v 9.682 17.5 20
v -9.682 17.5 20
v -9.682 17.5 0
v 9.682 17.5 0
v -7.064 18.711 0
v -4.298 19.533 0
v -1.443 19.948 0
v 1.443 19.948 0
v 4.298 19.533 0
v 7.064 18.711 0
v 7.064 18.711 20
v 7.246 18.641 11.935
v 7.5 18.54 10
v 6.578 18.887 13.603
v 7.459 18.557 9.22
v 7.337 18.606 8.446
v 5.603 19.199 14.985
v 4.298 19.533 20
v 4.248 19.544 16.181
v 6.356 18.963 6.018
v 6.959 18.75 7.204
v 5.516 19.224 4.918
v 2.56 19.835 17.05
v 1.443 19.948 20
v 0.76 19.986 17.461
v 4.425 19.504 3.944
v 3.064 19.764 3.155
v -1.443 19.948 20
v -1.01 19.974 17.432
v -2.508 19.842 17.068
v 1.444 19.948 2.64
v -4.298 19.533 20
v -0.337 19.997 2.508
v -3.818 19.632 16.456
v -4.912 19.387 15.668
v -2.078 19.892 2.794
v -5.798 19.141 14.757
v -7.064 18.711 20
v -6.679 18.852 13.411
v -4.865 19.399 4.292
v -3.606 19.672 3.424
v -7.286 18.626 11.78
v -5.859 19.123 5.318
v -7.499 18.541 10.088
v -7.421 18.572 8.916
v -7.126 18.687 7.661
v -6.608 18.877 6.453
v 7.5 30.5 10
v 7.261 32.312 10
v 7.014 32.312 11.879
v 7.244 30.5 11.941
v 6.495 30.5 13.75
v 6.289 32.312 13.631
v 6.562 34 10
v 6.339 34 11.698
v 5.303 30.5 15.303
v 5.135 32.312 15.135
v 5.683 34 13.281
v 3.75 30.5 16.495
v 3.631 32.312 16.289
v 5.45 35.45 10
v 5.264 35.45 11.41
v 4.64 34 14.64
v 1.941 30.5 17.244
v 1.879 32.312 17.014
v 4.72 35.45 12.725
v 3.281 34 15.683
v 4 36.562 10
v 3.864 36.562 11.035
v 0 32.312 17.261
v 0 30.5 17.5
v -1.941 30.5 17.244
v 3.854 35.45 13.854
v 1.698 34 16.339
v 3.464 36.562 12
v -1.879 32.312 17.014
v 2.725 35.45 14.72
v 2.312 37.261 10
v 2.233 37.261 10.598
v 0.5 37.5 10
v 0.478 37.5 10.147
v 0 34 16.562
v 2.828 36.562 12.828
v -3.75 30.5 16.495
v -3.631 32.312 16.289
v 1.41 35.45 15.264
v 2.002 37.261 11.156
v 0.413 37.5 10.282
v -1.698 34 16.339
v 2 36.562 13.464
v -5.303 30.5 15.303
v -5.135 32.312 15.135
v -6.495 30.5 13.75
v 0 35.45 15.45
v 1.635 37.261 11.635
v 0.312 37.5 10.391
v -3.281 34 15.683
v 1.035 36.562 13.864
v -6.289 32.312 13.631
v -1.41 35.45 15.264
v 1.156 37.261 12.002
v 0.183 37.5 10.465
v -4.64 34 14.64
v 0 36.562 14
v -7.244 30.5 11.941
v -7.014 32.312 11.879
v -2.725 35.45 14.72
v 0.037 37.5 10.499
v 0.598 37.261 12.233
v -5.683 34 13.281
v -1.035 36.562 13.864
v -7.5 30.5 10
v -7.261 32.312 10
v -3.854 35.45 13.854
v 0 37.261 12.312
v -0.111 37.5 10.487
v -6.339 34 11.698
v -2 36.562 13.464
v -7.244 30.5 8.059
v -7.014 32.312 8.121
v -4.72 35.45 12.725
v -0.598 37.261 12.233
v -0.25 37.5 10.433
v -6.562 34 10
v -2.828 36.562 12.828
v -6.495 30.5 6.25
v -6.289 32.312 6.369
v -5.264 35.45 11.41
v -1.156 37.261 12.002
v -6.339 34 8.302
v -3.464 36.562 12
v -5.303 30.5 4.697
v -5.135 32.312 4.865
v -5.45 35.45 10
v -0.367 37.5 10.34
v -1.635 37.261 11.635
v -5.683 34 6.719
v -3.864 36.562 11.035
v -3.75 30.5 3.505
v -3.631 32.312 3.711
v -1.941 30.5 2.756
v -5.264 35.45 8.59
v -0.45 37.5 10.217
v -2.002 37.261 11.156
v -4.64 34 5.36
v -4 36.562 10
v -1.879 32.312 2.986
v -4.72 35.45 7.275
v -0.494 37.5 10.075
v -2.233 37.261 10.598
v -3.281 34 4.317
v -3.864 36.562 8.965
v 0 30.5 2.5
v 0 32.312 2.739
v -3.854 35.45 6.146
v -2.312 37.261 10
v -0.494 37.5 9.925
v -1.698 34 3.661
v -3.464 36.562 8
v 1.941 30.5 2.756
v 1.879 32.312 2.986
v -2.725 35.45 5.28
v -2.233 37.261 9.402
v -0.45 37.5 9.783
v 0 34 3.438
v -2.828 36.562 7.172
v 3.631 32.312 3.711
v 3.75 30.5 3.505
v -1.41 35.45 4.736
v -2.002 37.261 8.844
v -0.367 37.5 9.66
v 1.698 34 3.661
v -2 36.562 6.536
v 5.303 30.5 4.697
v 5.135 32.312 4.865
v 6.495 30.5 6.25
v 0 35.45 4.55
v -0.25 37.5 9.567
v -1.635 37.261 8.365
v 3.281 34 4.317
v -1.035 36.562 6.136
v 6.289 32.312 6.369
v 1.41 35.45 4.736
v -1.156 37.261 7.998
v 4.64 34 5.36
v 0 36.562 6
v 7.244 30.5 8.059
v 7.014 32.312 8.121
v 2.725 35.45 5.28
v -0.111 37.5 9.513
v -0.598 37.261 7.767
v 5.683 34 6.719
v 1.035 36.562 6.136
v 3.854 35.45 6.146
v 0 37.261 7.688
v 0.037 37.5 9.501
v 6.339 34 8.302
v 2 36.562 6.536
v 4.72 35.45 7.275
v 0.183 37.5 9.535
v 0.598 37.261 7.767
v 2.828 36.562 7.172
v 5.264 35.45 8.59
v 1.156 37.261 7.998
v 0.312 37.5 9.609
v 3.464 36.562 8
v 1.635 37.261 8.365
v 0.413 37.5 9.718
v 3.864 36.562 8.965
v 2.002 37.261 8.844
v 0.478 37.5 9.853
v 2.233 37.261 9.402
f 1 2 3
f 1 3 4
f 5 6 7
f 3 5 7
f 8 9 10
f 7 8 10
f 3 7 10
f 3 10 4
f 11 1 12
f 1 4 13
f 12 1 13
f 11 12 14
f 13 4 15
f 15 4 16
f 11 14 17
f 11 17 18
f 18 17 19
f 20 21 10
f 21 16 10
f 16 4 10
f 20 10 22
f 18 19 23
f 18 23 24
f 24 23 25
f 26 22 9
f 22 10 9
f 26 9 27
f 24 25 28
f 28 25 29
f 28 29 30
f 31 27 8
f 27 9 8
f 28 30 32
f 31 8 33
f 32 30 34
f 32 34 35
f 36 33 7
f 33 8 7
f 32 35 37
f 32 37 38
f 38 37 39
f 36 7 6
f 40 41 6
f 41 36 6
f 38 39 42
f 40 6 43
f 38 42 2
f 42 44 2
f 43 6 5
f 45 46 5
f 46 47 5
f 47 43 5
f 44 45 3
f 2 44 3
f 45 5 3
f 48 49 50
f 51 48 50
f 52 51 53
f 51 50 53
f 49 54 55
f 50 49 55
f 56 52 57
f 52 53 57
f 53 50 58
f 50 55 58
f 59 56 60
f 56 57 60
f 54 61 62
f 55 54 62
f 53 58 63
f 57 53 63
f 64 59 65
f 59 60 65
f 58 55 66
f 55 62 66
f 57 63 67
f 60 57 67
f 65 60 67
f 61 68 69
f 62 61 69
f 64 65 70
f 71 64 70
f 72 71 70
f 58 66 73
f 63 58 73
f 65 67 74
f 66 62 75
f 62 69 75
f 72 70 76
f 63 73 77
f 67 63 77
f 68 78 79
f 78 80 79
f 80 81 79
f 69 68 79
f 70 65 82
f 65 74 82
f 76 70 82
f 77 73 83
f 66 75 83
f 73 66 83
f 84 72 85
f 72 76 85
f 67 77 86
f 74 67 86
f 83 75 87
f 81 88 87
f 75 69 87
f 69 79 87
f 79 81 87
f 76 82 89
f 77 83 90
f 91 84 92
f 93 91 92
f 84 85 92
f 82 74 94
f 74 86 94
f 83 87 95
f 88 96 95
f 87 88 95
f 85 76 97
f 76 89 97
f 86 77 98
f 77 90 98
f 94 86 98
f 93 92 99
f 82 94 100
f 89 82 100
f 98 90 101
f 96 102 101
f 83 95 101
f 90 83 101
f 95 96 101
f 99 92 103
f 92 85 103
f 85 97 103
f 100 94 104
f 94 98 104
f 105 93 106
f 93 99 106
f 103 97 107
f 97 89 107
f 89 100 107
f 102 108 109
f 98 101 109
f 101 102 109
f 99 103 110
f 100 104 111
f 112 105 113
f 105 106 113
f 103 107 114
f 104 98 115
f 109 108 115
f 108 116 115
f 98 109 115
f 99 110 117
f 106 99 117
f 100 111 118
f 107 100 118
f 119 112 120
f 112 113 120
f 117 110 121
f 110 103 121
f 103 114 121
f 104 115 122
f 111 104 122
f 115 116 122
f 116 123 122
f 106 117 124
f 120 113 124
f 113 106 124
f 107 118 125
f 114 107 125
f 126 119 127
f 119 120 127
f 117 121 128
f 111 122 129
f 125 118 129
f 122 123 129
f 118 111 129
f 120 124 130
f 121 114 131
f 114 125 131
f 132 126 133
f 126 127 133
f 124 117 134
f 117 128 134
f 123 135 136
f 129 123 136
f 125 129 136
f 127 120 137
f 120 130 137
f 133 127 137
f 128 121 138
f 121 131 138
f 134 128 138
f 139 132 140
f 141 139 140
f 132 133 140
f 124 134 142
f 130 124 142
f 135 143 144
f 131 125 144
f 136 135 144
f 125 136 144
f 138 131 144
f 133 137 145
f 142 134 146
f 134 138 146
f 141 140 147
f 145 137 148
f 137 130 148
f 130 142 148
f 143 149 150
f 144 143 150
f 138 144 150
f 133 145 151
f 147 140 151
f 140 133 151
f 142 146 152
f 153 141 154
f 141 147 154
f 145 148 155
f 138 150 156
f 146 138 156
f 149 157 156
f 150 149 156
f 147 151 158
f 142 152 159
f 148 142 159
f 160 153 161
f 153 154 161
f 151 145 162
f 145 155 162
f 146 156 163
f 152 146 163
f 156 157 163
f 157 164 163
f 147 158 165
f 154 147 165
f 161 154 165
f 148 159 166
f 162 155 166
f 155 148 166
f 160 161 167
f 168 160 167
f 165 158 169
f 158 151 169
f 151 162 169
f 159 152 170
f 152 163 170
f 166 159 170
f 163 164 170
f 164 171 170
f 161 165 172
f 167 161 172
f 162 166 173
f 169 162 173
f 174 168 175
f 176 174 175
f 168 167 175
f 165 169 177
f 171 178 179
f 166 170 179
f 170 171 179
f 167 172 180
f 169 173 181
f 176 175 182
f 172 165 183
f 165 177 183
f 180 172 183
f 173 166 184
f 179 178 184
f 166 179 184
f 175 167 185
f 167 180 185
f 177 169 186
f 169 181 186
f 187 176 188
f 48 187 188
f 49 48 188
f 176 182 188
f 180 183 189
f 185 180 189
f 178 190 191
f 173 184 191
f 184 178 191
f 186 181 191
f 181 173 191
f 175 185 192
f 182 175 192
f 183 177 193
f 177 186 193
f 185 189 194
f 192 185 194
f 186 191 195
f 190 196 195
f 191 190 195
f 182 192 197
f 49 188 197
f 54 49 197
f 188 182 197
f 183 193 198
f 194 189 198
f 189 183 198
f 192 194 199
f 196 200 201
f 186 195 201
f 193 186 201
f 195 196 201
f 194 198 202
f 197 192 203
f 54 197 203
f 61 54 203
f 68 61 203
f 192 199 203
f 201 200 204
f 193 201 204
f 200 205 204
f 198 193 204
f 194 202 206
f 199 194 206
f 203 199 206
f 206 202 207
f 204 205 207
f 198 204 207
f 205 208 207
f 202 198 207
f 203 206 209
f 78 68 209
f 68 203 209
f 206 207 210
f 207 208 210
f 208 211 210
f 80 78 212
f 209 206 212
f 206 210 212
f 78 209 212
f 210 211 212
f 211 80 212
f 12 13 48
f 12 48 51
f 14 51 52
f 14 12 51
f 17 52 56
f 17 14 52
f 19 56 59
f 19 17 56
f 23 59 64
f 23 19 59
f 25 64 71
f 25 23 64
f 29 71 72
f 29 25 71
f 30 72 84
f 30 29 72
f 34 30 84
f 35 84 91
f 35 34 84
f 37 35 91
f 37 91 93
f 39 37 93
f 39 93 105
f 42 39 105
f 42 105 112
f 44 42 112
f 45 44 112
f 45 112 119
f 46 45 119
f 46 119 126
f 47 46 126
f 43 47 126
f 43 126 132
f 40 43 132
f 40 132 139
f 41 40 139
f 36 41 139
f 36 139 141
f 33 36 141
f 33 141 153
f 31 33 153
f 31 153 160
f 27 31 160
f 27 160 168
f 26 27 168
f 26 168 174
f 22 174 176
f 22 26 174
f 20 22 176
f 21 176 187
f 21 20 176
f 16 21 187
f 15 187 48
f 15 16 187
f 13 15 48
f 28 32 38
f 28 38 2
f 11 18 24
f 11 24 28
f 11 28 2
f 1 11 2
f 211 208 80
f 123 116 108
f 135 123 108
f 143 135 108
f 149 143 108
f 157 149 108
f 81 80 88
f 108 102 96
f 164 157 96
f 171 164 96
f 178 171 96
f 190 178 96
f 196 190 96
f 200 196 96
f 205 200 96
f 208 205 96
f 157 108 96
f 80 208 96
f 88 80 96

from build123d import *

# Parameters (mm, degrees)
F1_DEPTH = 20
F2_R     = 7.5
F3_DEPTH = 20
F4_R     = 7


with BuildPart() as f1:
    # F0 (on Top) → F1 (new body)
    with BuildSketch(Plane.XY):
        with BuildLine():
            ThreePointArc((9.682458, 17.5), (0, 20), (-9.682458, 17.5))
            Line((-9.682458, 17.5), (9.682458, 17.5))
        make_face()
    extrude(amount=F1_DEPTH)

    # F2 (on face) → F3 (join)
    with BuildSketch(Plane.XZ.offset(-17.5)):
        with Locations((0, 10)):
            Circle(F2_R)
    extrude(amount=-F3_DEPTH)

    # F4
    f4_edges = [f1.edges().sort_by_distance(p)[0] for p in [
        (-7.5, 37.5, 10),
    ]]
    fillet(f4_edges, radius=F4_R)


solid = f1.part
